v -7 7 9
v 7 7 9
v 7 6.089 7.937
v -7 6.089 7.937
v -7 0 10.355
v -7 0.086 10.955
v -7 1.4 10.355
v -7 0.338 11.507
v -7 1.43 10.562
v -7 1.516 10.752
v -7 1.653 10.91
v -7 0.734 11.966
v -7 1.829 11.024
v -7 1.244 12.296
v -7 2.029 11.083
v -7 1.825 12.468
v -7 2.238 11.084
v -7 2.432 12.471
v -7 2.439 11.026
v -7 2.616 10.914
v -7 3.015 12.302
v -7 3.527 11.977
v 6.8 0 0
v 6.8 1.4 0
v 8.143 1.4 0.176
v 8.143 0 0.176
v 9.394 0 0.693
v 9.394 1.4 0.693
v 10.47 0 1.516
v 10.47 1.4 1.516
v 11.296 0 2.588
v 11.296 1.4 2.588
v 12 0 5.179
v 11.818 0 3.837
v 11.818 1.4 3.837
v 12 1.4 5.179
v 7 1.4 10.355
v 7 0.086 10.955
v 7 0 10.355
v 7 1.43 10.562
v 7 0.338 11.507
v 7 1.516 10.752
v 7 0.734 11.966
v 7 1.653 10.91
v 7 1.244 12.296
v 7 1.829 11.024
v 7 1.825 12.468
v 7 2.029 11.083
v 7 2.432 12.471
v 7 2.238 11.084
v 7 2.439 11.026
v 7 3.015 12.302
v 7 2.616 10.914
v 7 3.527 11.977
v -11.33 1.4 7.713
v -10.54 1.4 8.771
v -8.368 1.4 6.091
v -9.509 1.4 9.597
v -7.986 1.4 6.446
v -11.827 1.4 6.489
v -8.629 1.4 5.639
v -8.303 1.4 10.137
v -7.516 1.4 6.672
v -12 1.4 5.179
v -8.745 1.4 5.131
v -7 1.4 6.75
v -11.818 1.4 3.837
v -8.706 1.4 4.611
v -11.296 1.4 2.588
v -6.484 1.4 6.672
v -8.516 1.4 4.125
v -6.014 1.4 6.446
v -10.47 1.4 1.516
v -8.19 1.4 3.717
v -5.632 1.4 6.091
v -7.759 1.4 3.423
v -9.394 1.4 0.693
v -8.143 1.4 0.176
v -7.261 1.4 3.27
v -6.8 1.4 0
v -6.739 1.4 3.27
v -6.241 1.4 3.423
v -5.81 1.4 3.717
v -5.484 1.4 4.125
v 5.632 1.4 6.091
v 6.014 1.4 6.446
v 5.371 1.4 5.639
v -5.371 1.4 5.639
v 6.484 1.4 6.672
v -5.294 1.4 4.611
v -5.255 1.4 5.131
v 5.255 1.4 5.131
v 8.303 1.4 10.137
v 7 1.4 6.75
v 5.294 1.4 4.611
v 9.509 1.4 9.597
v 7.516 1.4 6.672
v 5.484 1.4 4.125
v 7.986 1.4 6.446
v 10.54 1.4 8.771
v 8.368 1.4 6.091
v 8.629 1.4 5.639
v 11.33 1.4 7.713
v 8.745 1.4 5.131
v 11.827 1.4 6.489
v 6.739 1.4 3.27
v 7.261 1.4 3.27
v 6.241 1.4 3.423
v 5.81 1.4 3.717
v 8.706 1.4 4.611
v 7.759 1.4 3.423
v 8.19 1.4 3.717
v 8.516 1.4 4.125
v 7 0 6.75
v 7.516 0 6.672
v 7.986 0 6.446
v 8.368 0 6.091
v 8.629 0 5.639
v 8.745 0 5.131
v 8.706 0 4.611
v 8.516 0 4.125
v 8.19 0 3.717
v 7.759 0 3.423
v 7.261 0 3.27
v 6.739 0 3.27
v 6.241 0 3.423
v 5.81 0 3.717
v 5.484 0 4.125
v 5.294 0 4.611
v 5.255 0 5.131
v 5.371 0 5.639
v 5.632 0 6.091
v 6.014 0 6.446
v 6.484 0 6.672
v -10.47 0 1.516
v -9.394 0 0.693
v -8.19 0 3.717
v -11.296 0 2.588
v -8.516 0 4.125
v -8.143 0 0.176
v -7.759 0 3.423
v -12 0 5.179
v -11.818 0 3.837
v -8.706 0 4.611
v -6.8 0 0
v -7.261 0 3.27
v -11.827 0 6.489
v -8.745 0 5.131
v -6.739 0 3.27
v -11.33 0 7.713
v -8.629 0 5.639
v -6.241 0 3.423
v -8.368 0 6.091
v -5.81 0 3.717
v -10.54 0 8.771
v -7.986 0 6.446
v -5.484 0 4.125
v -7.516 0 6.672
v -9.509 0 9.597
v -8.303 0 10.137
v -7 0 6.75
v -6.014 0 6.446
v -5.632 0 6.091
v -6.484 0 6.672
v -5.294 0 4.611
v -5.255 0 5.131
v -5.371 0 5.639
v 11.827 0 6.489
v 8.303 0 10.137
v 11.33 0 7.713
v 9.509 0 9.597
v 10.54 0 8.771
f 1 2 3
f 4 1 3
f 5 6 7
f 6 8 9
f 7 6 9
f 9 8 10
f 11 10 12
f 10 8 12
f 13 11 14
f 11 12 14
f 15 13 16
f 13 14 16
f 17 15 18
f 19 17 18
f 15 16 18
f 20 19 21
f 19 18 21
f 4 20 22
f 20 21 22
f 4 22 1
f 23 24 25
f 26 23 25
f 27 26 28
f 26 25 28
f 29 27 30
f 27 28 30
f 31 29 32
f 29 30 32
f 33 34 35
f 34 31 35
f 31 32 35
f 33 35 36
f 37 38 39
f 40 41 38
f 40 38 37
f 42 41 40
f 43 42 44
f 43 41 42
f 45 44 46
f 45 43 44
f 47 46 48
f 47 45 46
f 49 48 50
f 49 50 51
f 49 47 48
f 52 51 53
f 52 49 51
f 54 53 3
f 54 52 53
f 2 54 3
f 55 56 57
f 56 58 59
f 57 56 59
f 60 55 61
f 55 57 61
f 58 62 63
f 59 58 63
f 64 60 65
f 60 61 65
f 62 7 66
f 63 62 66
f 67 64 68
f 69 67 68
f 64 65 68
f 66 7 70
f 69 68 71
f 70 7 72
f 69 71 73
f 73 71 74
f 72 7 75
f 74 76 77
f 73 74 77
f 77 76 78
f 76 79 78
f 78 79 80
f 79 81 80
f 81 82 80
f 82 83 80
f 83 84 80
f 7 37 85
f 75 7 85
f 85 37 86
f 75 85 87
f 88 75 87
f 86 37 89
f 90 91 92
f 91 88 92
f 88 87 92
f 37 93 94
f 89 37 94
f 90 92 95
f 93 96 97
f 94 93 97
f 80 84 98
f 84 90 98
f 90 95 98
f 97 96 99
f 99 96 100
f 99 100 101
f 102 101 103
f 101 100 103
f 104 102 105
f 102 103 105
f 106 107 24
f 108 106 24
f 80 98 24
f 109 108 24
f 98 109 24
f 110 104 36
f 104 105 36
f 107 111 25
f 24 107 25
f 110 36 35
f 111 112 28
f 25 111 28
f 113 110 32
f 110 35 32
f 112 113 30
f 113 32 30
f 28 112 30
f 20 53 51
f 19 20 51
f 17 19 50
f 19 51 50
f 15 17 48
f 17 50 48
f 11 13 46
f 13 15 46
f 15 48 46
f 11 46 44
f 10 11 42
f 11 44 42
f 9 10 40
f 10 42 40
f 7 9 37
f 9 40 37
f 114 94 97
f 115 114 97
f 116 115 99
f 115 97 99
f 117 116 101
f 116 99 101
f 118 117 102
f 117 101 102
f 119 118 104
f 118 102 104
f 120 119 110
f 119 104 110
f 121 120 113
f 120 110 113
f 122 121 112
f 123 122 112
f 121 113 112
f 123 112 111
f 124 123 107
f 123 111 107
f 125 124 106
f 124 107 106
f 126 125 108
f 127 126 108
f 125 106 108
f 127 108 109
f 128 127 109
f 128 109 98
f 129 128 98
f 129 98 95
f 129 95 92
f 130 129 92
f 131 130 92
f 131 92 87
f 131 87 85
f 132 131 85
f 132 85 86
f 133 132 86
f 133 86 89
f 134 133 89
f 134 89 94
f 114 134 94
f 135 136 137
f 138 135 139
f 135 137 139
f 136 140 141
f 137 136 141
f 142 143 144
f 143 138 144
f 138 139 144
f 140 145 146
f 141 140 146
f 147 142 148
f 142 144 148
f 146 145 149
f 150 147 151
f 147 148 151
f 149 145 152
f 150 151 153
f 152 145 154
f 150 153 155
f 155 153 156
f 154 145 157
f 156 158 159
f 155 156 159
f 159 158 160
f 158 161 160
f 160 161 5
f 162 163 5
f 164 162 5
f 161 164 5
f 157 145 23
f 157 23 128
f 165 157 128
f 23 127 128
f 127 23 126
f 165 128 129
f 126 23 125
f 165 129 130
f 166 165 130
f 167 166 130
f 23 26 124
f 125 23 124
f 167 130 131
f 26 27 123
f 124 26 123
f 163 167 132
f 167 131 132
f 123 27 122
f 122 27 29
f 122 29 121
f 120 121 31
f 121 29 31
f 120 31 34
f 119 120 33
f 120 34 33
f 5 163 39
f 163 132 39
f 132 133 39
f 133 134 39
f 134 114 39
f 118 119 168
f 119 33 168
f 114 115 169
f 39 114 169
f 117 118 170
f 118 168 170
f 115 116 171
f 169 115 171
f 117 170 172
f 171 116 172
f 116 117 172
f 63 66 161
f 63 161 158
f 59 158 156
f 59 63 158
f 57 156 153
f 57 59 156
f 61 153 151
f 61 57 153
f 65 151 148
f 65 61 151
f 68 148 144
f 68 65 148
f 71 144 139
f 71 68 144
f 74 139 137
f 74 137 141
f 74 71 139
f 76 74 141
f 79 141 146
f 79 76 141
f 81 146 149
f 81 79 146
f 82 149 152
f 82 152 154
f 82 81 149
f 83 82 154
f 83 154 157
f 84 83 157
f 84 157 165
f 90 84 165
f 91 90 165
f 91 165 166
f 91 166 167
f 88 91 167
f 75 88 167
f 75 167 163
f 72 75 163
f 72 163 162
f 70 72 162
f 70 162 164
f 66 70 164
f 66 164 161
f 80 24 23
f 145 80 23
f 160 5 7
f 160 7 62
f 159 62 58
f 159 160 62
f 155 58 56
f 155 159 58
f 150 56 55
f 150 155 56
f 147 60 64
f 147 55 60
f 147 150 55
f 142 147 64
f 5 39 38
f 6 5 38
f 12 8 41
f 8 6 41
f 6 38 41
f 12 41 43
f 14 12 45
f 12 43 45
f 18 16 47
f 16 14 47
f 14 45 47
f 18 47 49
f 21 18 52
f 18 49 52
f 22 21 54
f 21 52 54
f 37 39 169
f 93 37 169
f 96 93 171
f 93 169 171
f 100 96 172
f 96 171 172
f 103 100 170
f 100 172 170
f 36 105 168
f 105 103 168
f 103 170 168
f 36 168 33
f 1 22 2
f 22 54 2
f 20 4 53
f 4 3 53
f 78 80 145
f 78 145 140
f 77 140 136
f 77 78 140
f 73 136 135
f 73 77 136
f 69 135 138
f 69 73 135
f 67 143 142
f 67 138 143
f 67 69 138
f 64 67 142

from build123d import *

# Parameters (mm, degrees)
T_LE_DE_BASE_PLI_E1_DEPTH = 12
ENL_V_START               = 7
ENL_V_MAT_EXTRU_1_DEPTH   = 5
ESQUISSE7_R               = 1.75
ENL_V_MAT_EXTRU_2_DEPTH   = 10
CONG_1_R                  = 5.2


# Read off the part's stored shape, not the designer's step: Enlèv. mat.-Extru.1
# Sheet-metal steps are written as plain solids
with BuildPart() as part:
    # Esquisse1 → Tôle de base pliée1 (new body)
    with BuildSketch(Plane(origin=(0, 0, 0), x_dir=(0, 0, -1), z_dir=(1, 0, 0))):
        with BuildLine():
            Line((0, 0), (-10.354560188, 0))
            ThreePointArc((-10.354560188, 0), (-12.295688846, 1.243807141), (-11.976787844, 3.527080849))
            Line((-11.976787844, 3.527080849), (-9, 7))
            Line((-9, 7), (-7.937040757, 6.088892077))
            Line((-7.937040757, 6.088892077), (-10.913828601, 2.615972926))
            ThreePointArc((-10.913828601, 2.615972926), (-11.023770789, 1.828806674), (-10.354560188, 1.4))
            Line((-10.354560188, 1.4), (0, 1.4))
            Line((0, 1.4), (0, 0))
        make_face()
    extrude(amount=T_LE_DE_BASE_PLI_E1_DEPTH)

    # Enlèv. mat.-Extru.1 outline → Enlèv. mat.-Extru.1 (cut)
    with BuildSketch(Plane.YZ.offset(ENL_V_START)):
        with BuildLine():
            Line((0, 10.354560188), (1.4, 10.354560188))
            ThreePointArc((1.4, 10.354560188), (1.828806674, 11.023770789), (2.615972926, 10.913828601))
            Line((2.615972926, 10.913828601), (6.088892077, 7.937040757))
            Line((6.088892077, 7.937040757), (7, 9))
            Line((7, 9), (3.527080849, 11.976787844))
            ThreePointArc((3.527080849, 11.976787844), (1.243807141, 12.295688846), (0, 10.354560188))
        make_face()
    extrude(amount=ENL_V_MAT_EXTRU_1_DEPTH, mode=Mode.SUBTRACT)

    # Esquisse7 → Enlèv. mat.-Extru.2 (cut)
    with BuildSketch(Plane(origin=(0, 1.4, 0), x_dir=(1, 0, 0), z_dir=(0, 1, 0))):
        with Locations(Location((7, -5, 0), (0, 0, 270))):
            Circle(ESQUISSE7_R)
    extrude(amount=-ENL_V_MAT_EXTRU_2_DEPTH, mode=Mode.SUBTRACT)

    # Congé1
    # the kernel refuses this fillet: 5.2 mm, written as the material it takes off along each edge
    with BuildSketch(Plane(origin=(12, -12.990381057, 10.354560188), x_dir=(-1, 0, 0), z_dir=(0, 1, 0))) as cong_1_piece_1:
        with BuildLine():
            CenterArc((5.2, -5.196152423), CONG_1_R, 92.204227504, 87.795772496)
            Line((0, -5.196152423), (-0.104, -5.196152423))
            Line((-0.104, -5.196152423), (-0.104, 0))
            Line((-0.104, 0), (0, 0.104))
            ThreePointArc((0, 0.104), (2.5, 0.104), (4.996, 0.103923048))
            Line((4.996, 0.103923048), (5, 0))
        make_face()
    extrude(amount=27.380762114, mode=Mode.SUBTRACT)
    with BuildSketch(Plane(origin=(12, 14.4, 0), x_dir=(-1, 0, 0), z_dir=(0, -1, 0))) as cong_1_piece_2:
        with BuildLine():
            CenterArc((CONG_1_R, -CONG_1_R), CONG_1_R, 90, 90)
            Line((0, -CONG_1_R), (-CONG_1_R * 0.02, -CONG_1_R))
            Line((-CONG_1_R * 0.02, -CONG_1_R), (-CONG_1_R * 0.02, CONG_1_R * 0.02))
            Line((-CONG_1_R * 0.02, CONG_1_R * 0.02), (CONG_1_R, CONG_1_R * 0.02))
            Line((CONG_1_R, CONG_1_R * 0.02), (CONG_1_R, 0))
        make_face()
    extrude(amount=27.4, mode=Mode.SUBTRACT)

    # Symétrie1: part across plane


with BuildPart() as part_1:
    add(part.part)
    add(part.part.mirror(Plane(origin=(0, 2.615972926, 10.913828601), x_dir=(0, 0, 1), z_dir=(-1, 0, 0))))


solid = part_1.part
